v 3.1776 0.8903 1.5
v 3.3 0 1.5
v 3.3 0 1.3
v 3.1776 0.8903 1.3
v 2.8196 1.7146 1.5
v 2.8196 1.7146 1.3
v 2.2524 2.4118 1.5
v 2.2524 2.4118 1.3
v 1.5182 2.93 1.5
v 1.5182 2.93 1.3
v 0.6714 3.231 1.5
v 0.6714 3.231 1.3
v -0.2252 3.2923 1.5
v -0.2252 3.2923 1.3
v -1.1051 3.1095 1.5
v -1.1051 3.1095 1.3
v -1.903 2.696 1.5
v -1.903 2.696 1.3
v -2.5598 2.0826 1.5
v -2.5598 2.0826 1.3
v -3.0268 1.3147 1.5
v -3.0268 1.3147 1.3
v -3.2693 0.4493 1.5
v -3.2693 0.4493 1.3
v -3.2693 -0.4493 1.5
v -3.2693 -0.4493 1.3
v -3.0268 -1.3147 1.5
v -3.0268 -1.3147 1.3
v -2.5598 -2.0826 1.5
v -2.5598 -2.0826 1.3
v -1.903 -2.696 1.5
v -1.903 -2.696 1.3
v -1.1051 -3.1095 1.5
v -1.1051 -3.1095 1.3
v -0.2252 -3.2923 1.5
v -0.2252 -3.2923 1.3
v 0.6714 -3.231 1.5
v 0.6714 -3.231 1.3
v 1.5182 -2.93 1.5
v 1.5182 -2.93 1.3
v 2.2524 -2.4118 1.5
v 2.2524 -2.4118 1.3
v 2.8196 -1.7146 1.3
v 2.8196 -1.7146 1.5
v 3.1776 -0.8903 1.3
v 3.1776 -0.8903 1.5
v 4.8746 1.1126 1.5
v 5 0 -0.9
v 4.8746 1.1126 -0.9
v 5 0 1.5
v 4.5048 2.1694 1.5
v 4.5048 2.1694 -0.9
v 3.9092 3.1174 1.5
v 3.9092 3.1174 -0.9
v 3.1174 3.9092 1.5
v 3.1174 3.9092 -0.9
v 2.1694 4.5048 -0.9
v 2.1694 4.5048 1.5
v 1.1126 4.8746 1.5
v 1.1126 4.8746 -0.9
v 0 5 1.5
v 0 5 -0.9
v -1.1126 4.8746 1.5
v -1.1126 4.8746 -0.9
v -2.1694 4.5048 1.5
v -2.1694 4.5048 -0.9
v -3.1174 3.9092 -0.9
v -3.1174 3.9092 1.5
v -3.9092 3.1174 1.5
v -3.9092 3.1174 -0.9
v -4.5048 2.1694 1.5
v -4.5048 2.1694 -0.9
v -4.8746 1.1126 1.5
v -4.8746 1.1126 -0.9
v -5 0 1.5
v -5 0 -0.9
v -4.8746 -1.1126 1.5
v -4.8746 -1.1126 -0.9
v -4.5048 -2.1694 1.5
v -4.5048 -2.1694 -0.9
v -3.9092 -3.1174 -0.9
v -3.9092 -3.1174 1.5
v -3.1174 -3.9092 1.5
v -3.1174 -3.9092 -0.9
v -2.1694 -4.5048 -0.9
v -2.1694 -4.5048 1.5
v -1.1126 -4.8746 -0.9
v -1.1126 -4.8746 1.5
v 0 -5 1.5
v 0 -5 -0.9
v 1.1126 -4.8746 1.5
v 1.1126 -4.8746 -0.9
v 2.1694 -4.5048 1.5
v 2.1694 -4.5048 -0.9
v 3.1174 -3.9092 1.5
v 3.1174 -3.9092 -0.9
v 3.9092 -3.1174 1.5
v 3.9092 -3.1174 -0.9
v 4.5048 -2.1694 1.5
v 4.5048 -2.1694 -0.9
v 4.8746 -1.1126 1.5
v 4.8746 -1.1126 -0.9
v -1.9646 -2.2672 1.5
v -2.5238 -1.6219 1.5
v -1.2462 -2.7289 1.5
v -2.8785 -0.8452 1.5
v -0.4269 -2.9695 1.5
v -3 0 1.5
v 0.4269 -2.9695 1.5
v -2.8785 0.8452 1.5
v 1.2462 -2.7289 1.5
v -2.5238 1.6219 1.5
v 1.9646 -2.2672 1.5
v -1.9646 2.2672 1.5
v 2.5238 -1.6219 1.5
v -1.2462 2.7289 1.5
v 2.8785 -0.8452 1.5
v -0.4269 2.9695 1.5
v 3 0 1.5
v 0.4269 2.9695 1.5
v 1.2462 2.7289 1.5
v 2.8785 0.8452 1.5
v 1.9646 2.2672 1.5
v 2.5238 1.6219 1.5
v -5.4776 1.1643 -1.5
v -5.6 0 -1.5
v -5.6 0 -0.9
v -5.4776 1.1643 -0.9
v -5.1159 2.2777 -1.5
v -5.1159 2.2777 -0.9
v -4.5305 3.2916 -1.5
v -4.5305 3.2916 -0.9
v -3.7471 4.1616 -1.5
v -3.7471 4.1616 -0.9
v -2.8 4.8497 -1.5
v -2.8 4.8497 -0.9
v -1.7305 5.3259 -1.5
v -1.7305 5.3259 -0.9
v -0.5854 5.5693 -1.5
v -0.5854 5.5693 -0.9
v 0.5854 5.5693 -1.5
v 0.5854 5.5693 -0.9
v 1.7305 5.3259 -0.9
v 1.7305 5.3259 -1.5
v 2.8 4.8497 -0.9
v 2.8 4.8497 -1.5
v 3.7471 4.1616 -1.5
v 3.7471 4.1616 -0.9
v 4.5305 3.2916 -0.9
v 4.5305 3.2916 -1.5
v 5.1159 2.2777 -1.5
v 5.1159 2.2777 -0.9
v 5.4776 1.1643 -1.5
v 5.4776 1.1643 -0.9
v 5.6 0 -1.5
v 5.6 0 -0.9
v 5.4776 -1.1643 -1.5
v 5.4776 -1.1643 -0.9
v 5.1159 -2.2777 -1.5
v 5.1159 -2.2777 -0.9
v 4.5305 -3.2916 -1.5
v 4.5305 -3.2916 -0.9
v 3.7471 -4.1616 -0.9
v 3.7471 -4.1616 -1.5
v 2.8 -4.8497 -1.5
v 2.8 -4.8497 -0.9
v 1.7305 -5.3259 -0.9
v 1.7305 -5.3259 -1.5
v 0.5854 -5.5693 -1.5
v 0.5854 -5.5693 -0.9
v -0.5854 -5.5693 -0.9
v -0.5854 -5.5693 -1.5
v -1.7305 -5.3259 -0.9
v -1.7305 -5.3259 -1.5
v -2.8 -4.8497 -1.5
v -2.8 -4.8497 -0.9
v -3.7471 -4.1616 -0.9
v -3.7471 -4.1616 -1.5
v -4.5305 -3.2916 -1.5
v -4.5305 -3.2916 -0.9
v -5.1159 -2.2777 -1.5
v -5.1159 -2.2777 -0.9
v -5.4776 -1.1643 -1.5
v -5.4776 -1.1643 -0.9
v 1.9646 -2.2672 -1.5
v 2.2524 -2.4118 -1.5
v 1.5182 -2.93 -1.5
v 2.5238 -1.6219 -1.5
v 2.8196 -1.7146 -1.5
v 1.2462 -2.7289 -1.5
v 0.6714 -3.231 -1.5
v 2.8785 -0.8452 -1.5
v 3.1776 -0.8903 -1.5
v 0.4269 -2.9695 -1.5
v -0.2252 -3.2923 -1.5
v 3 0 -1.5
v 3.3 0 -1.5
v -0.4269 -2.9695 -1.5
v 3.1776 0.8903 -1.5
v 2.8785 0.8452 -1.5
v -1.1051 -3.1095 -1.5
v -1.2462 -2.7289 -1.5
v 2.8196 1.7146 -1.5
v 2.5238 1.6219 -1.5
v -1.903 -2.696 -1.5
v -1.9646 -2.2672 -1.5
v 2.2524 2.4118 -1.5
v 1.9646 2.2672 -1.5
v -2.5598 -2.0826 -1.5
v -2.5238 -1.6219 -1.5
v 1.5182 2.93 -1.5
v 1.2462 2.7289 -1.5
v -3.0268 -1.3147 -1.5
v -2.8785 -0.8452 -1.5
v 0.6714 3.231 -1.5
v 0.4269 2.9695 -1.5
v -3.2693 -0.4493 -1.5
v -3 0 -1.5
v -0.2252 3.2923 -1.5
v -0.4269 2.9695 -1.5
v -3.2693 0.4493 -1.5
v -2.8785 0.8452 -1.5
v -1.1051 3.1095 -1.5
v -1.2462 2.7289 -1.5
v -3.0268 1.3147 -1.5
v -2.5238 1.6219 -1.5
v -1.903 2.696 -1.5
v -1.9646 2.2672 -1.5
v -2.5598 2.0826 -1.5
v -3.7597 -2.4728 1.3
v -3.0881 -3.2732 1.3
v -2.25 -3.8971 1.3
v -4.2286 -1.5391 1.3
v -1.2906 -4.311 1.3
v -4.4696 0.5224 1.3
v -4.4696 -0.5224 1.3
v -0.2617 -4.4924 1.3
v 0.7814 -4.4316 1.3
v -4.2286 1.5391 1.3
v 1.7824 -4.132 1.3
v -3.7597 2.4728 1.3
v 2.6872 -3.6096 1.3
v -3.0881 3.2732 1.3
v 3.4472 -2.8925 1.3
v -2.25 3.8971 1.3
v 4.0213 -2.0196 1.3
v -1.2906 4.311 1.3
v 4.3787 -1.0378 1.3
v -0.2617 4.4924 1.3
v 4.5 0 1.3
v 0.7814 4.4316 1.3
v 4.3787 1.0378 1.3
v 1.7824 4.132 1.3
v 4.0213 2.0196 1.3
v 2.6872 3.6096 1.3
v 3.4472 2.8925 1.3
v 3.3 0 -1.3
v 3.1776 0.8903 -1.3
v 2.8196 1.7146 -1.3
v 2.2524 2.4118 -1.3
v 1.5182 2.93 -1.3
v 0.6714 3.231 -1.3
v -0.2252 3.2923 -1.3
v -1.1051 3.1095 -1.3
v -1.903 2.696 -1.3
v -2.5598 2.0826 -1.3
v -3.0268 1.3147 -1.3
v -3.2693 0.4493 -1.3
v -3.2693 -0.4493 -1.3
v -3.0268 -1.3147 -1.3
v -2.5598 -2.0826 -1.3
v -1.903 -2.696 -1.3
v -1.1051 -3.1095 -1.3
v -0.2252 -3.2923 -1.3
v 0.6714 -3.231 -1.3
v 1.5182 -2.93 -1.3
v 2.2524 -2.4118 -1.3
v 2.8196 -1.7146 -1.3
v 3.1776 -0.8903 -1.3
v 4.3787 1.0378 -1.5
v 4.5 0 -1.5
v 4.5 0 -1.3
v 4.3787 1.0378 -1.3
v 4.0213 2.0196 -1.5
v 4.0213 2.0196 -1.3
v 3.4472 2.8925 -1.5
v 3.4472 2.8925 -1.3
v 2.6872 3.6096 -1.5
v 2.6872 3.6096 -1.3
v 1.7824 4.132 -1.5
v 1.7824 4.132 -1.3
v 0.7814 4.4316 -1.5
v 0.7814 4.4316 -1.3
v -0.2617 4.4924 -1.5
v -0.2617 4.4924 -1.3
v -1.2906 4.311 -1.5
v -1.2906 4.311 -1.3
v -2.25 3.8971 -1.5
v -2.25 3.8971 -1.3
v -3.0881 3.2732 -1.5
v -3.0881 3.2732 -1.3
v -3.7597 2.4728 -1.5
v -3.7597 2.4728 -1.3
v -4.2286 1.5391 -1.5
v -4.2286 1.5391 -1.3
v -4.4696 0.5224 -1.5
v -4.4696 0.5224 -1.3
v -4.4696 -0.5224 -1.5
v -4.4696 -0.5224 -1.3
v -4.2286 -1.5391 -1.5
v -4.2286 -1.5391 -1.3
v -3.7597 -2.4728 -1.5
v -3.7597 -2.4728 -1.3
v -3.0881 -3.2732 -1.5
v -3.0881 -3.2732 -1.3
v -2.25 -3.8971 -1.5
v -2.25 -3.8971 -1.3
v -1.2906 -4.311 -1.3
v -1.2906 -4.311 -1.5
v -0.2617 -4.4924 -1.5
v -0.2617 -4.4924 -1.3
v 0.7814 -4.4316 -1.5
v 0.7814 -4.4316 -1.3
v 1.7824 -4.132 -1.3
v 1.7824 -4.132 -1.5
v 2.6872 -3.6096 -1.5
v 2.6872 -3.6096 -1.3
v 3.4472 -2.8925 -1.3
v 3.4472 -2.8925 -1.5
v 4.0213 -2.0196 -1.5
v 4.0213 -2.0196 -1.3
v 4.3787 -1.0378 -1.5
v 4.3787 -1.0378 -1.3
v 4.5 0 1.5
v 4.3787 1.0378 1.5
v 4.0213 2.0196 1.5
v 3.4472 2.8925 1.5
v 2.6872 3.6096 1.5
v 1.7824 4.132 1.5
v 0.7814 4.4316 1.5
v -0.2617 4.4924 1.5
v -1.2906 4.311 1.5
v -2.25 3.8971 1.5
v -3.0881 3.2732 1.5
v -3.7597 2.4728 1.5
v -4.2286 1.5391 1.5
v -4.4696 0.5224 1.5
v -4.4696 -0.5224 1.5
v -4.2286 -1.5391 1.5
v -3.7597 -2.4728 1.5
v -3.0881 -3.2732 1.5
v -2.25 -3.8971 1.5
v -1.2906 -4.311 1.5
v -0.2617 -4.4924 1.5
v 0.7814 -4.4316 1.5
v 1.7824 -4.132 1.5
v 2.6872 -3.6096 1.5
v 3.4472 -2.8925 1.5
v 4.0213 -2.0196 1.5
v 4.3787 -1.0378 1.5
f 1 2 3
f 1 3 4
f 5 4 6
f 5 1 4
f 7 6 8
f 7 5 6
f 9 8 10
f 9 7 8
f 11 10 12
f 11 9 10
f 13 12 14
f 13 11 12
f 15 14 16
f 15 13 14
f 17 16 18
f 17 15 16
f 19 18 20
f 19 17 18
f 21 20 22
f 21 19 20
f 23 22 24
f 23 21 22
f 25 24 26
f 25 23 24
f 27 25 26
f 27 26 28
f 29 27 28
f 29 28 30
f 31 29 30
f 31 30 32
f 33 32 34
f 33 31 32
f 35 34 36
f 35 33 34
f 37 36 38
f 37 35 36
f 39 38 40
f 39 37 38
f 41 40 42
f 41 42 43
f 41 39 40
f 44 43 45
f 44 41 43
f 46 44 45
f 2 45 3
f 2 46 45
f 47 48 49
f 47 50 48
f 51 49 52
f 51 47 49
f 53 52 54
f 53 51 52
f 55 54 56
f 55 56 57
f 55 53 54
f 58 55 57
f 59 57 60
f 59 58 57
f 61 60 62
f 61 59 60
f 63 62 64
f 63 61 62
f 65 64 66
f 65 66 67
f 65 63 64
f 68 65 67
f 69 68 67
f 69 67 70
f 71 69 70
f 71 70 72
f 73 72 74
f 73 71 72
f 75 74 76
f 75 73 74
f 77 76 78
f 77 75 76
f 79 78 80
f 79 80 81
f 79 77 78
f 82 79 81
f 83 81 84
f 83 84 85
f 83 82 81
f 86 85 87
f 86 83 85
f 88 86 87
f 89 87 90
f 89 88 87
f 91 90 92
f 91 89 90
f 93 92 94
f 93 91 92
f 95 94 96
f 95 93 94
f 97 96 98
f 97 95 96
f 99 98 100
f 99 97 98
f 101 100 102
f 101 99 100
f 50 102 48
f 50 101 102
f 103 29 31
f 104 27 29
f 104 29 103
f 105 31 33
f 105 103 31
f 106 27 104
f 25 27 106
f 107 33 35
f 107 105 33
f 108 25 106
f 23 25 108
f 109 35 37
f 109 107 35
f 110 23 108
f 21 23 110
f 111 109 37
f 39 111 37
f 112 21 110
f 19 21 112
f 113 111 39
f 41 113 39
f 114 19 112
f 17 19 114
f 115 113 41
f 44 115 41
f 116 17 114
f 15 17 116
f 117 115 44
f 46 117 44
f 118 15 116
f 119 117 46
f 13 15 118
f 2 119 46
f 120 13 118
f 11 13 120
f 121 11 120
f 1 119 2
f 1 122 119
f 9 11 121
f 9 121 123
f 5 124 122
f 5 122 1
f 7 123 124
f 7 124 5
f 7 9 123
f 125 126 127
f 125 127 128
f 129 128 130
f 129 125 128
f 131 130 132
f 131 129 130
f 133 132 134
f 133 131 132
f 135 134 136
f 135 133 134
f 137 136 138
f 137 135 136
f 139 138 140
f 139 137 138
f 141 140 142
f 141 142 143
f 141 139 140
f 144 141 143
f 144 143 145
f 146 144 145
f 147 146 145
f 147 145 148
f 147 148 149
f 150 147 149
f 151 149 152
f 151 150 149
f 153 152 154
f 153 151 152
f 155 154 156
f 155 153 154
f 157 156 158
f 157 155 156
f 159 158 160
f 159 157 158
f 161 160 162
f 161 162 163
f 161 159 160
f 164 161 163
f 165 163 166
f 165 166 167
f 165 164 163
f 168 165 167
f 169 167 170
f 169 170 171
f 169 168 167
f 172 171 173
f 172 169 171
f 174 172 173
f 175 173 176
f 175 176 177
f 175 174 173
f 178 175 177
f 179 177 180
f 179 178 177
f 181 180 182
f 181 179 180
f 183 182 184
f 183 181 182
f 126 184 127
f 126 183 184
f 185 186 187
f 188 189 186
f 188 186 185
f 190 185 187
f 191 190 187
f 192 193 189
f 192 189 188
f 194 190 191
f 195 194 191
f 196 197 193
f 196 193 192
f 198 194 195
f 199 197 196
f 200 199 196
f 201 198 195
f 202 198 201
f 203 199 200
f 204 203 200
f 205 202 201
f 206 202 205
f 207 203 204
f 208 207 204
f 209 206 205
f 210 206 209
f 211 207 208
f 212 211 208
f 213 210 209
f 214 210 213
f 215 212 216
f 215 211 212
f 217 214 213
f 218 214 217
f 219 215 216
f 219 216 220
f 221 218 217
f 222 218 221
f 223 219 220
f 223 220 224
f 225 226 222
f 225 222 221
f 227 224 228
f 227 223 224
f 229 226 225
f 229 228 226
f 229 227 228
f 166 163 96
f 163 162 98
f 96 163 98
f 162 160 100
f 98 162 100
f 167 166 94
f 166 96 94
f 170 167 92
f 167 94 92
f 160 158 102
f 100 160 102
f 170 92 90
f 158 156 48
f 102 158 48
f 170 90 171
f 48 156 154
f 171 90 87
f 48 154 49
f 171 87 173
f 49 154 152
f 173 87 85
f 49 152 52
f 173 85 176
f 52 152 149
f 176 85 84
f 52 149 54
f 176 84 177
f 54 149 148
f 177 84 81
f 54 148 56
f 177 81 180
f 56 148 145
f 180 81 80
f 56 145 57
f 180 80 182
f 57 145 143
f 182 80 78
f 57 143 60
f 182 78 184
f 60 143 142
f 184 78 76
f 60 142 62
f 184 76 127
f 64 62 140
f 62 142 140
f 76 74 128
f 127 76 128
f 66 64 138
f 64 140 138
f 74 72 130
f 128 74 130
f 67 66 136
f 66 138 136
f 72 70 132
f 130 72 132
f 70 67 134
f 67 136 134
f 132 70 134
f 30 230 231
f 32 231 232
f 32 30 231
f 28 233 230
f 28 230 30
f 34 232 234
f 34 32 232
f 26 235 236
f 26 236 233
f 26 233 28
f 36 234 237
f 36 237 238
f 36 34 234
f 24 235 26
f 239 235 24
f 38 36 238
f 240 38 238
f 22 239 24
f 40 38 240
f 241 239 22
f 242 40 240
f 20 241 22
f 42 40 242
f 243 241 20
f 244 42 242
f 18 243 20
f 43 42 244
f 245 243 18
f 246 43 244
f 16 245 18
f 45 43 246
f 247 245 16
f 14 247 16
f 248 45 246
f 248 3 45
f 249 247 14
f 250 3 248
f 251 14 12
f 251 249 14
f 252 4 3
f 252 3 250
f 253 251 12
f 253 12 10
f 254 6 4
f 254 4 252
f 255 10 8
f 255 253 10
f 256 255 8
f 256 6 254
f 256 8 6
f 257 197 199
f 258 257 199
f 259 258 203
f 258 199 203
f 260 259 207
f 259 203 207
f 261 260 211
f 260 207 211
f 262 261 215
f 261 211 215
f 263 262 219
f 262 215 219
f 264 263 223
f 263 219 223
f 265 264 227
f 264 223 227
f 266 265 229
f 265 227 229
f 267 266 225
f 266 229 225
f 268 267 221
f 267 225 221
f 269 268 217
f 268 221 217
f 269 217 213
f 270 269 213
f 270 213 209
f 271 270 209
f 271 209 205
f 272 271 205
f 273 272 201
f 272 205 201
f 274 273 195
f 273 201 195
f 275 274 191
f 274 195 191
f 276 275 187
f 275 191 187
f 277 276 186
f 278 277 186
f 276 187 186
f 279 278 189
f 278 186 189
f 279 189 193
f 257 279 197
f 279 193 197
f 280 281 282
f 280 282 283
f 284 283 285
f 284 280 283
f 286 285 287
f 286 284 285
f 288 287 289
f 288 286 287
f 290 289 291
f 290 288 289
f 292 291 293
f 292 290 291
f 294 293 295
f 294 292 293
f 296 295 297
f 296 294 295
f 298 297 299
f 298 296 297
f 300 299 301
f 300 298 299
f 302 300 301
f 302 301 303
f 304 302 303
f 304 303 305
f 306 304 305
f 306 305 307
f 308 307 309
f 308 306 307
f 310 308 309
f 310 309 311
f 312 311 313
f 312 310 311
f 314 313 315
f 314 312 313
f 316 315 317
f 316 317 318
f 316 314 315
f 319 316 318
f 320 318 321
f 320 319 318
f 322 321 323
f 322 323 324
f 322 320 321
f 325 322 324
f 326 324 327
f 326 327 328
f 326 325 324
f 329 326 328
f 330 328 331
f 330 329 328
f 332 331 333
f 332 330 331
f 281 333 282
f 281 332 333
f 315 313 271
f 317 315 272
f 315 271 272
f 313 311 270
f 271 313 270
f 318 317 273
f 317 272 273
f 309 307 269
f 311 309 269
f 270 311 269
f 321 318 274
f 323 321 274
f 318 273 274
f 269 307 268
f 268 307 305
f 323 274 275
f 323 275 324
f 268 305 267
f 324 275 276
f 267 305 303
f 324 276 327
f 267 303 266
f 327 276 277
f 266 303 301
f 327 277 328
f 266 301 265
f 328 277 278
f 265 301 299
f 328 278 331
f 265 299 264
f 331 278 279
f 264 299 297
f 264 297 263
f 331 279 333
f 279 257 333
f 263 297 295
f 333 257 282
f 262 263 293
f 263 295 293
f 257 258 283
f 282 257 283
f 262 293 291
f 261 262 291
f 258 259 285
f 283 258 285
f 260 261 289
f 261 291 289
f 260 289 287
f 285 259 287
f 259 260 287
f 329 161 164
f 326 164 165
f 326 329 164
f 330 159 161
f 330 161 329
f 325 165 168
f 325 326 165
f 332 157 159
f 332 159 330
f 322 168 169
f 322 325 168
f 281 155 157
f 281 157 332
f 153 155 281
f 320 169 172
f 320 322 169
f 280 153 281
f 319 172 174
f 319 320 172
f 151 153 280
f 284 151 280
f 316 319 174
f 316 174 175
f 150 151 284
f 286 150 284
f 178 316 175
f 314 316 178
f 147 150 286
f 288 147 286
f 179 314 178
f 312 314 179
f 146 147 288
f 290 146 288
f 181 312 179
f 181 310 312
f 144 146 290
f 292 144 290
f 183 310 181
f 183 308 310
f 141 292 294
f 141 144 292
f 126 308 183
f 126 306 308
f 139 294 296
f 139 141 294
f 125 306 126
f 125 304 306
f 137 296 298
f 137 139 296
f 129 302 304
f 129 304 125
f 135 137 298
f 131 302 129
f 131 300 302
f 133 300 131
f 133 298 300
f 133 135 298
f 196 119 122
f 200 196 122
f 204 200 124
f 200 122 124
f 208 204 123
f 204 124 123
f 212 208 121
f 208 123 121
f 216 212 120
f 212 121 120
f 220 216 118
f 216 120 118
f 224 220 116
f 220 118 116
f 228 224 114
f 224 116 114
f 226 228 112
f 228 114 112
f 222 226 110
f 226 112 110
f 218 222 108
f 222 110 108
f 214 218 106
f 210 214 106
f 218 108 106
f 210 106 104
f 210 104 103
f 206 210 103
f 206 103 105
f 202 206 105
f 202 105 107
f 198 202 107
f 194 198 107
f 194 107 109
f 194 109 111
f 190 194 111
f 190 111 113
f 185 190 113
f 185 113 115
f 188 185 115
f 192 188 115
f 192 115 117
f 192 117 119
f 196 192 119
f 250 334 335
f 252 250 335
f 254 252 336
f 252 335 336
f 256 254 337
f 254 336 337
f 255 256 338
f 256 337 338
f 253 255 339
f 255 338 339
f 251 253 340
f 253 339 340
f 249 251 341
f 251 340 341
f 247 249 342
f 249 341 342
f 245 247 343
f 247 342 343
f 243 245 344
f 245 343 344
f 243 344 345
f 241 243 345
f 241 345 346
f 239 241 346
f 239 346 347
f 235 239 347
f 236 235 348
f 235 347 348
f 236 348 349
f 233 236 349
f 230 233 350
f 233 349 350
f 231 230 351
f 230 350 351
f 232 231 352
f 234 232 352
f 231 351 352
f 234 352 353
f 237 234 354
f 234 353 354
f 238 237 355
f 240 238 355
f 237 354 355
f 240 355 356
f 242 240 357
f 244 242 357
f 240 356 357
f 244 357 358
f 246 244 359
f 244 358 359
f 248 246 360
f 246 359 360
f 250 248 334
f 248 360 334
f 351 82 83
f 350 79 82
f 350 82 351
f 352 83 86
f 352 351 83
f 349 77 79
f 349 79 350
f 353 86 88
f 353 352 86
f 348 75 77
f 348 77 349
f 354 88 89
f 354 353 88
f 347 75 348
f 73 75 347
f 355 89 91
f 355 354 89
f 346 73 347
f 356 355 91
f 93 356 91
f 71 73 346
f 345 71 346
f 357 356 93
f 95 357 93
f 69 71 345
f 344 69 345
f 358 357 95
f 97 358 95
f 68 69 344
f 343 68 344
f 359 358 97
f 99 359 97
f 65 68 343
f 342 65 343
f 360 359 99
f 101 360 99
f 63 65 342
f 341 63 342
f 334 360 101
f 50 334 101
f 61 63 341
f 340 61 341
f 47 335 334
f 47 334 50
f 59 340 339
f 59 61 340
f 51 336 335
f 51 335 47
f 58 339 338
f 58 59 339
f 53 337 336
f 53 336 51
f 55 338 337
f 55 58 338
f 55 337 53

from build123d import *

# Parameters (mm, degrees)
SKETCH_1_R          = 5
EXTRUDE_1_DEPTH     = 1.5
SKETCH_4_R          = 5.6
EXTRUDE_2_DEPTH     = 0.6
SKETCH_2_R          = 3
CUT_EXTRUDE_1_DEPTH = 4
SKETCH_3_R          = 4.5
SKETCH_3_R_2        = 3.3
CUT_EXTRUDE_2_DEPTH = 0.2


with BuildPart() as part:
    # 草圖1 → 填料-伸長1 (new body, symmetric)
    with BuildSketch(Plane.XY):
        Circle(SKETCH_1_R)
    extrude(amount=EXTRUDE_1_DEPTH, both=True)

    # 草圖4 → 填料-伸長2 (add)
    with BuildSketch(Plane(origin=(0, 0, -1.5), x_dir=(-1, 0, 0), z_dir=(0, 0, -1))):
        Circle(SKETCH_4_R)
    extrude(amount=-EXTRUDE_2_DEPTH)

    # 草圖2 → 除料-伸長1 (cut, through all)
    with BuildSketch(Plane.XY.offset(1.5)):
        Circle(SKETCH_2_R)
    extrude(amount=-CUT_EXTRUDE_1_DEPTH, mode=Mode.SUBTRACT)

    # 草圖3 → 除料-伸長2 (cut)
    with BuildSketch(Plane.XY.offset(1.5)):
        Circle(SKETCH_3_R)
        Circle(SKETCH_3_R_2, mode=Mode.SUBTRACT)
    cut_extrude_2 = extrude(amount=-CUT_EXTRUDE_2_DEPTH, mode=Mode.SUBTRACT)

    # 鏡射1: 除料-伸長2 across plane
    add(cut_extrude_2.mirror(Plane.XY), mode=Mode.SUBTRACT)


solid = part.part
